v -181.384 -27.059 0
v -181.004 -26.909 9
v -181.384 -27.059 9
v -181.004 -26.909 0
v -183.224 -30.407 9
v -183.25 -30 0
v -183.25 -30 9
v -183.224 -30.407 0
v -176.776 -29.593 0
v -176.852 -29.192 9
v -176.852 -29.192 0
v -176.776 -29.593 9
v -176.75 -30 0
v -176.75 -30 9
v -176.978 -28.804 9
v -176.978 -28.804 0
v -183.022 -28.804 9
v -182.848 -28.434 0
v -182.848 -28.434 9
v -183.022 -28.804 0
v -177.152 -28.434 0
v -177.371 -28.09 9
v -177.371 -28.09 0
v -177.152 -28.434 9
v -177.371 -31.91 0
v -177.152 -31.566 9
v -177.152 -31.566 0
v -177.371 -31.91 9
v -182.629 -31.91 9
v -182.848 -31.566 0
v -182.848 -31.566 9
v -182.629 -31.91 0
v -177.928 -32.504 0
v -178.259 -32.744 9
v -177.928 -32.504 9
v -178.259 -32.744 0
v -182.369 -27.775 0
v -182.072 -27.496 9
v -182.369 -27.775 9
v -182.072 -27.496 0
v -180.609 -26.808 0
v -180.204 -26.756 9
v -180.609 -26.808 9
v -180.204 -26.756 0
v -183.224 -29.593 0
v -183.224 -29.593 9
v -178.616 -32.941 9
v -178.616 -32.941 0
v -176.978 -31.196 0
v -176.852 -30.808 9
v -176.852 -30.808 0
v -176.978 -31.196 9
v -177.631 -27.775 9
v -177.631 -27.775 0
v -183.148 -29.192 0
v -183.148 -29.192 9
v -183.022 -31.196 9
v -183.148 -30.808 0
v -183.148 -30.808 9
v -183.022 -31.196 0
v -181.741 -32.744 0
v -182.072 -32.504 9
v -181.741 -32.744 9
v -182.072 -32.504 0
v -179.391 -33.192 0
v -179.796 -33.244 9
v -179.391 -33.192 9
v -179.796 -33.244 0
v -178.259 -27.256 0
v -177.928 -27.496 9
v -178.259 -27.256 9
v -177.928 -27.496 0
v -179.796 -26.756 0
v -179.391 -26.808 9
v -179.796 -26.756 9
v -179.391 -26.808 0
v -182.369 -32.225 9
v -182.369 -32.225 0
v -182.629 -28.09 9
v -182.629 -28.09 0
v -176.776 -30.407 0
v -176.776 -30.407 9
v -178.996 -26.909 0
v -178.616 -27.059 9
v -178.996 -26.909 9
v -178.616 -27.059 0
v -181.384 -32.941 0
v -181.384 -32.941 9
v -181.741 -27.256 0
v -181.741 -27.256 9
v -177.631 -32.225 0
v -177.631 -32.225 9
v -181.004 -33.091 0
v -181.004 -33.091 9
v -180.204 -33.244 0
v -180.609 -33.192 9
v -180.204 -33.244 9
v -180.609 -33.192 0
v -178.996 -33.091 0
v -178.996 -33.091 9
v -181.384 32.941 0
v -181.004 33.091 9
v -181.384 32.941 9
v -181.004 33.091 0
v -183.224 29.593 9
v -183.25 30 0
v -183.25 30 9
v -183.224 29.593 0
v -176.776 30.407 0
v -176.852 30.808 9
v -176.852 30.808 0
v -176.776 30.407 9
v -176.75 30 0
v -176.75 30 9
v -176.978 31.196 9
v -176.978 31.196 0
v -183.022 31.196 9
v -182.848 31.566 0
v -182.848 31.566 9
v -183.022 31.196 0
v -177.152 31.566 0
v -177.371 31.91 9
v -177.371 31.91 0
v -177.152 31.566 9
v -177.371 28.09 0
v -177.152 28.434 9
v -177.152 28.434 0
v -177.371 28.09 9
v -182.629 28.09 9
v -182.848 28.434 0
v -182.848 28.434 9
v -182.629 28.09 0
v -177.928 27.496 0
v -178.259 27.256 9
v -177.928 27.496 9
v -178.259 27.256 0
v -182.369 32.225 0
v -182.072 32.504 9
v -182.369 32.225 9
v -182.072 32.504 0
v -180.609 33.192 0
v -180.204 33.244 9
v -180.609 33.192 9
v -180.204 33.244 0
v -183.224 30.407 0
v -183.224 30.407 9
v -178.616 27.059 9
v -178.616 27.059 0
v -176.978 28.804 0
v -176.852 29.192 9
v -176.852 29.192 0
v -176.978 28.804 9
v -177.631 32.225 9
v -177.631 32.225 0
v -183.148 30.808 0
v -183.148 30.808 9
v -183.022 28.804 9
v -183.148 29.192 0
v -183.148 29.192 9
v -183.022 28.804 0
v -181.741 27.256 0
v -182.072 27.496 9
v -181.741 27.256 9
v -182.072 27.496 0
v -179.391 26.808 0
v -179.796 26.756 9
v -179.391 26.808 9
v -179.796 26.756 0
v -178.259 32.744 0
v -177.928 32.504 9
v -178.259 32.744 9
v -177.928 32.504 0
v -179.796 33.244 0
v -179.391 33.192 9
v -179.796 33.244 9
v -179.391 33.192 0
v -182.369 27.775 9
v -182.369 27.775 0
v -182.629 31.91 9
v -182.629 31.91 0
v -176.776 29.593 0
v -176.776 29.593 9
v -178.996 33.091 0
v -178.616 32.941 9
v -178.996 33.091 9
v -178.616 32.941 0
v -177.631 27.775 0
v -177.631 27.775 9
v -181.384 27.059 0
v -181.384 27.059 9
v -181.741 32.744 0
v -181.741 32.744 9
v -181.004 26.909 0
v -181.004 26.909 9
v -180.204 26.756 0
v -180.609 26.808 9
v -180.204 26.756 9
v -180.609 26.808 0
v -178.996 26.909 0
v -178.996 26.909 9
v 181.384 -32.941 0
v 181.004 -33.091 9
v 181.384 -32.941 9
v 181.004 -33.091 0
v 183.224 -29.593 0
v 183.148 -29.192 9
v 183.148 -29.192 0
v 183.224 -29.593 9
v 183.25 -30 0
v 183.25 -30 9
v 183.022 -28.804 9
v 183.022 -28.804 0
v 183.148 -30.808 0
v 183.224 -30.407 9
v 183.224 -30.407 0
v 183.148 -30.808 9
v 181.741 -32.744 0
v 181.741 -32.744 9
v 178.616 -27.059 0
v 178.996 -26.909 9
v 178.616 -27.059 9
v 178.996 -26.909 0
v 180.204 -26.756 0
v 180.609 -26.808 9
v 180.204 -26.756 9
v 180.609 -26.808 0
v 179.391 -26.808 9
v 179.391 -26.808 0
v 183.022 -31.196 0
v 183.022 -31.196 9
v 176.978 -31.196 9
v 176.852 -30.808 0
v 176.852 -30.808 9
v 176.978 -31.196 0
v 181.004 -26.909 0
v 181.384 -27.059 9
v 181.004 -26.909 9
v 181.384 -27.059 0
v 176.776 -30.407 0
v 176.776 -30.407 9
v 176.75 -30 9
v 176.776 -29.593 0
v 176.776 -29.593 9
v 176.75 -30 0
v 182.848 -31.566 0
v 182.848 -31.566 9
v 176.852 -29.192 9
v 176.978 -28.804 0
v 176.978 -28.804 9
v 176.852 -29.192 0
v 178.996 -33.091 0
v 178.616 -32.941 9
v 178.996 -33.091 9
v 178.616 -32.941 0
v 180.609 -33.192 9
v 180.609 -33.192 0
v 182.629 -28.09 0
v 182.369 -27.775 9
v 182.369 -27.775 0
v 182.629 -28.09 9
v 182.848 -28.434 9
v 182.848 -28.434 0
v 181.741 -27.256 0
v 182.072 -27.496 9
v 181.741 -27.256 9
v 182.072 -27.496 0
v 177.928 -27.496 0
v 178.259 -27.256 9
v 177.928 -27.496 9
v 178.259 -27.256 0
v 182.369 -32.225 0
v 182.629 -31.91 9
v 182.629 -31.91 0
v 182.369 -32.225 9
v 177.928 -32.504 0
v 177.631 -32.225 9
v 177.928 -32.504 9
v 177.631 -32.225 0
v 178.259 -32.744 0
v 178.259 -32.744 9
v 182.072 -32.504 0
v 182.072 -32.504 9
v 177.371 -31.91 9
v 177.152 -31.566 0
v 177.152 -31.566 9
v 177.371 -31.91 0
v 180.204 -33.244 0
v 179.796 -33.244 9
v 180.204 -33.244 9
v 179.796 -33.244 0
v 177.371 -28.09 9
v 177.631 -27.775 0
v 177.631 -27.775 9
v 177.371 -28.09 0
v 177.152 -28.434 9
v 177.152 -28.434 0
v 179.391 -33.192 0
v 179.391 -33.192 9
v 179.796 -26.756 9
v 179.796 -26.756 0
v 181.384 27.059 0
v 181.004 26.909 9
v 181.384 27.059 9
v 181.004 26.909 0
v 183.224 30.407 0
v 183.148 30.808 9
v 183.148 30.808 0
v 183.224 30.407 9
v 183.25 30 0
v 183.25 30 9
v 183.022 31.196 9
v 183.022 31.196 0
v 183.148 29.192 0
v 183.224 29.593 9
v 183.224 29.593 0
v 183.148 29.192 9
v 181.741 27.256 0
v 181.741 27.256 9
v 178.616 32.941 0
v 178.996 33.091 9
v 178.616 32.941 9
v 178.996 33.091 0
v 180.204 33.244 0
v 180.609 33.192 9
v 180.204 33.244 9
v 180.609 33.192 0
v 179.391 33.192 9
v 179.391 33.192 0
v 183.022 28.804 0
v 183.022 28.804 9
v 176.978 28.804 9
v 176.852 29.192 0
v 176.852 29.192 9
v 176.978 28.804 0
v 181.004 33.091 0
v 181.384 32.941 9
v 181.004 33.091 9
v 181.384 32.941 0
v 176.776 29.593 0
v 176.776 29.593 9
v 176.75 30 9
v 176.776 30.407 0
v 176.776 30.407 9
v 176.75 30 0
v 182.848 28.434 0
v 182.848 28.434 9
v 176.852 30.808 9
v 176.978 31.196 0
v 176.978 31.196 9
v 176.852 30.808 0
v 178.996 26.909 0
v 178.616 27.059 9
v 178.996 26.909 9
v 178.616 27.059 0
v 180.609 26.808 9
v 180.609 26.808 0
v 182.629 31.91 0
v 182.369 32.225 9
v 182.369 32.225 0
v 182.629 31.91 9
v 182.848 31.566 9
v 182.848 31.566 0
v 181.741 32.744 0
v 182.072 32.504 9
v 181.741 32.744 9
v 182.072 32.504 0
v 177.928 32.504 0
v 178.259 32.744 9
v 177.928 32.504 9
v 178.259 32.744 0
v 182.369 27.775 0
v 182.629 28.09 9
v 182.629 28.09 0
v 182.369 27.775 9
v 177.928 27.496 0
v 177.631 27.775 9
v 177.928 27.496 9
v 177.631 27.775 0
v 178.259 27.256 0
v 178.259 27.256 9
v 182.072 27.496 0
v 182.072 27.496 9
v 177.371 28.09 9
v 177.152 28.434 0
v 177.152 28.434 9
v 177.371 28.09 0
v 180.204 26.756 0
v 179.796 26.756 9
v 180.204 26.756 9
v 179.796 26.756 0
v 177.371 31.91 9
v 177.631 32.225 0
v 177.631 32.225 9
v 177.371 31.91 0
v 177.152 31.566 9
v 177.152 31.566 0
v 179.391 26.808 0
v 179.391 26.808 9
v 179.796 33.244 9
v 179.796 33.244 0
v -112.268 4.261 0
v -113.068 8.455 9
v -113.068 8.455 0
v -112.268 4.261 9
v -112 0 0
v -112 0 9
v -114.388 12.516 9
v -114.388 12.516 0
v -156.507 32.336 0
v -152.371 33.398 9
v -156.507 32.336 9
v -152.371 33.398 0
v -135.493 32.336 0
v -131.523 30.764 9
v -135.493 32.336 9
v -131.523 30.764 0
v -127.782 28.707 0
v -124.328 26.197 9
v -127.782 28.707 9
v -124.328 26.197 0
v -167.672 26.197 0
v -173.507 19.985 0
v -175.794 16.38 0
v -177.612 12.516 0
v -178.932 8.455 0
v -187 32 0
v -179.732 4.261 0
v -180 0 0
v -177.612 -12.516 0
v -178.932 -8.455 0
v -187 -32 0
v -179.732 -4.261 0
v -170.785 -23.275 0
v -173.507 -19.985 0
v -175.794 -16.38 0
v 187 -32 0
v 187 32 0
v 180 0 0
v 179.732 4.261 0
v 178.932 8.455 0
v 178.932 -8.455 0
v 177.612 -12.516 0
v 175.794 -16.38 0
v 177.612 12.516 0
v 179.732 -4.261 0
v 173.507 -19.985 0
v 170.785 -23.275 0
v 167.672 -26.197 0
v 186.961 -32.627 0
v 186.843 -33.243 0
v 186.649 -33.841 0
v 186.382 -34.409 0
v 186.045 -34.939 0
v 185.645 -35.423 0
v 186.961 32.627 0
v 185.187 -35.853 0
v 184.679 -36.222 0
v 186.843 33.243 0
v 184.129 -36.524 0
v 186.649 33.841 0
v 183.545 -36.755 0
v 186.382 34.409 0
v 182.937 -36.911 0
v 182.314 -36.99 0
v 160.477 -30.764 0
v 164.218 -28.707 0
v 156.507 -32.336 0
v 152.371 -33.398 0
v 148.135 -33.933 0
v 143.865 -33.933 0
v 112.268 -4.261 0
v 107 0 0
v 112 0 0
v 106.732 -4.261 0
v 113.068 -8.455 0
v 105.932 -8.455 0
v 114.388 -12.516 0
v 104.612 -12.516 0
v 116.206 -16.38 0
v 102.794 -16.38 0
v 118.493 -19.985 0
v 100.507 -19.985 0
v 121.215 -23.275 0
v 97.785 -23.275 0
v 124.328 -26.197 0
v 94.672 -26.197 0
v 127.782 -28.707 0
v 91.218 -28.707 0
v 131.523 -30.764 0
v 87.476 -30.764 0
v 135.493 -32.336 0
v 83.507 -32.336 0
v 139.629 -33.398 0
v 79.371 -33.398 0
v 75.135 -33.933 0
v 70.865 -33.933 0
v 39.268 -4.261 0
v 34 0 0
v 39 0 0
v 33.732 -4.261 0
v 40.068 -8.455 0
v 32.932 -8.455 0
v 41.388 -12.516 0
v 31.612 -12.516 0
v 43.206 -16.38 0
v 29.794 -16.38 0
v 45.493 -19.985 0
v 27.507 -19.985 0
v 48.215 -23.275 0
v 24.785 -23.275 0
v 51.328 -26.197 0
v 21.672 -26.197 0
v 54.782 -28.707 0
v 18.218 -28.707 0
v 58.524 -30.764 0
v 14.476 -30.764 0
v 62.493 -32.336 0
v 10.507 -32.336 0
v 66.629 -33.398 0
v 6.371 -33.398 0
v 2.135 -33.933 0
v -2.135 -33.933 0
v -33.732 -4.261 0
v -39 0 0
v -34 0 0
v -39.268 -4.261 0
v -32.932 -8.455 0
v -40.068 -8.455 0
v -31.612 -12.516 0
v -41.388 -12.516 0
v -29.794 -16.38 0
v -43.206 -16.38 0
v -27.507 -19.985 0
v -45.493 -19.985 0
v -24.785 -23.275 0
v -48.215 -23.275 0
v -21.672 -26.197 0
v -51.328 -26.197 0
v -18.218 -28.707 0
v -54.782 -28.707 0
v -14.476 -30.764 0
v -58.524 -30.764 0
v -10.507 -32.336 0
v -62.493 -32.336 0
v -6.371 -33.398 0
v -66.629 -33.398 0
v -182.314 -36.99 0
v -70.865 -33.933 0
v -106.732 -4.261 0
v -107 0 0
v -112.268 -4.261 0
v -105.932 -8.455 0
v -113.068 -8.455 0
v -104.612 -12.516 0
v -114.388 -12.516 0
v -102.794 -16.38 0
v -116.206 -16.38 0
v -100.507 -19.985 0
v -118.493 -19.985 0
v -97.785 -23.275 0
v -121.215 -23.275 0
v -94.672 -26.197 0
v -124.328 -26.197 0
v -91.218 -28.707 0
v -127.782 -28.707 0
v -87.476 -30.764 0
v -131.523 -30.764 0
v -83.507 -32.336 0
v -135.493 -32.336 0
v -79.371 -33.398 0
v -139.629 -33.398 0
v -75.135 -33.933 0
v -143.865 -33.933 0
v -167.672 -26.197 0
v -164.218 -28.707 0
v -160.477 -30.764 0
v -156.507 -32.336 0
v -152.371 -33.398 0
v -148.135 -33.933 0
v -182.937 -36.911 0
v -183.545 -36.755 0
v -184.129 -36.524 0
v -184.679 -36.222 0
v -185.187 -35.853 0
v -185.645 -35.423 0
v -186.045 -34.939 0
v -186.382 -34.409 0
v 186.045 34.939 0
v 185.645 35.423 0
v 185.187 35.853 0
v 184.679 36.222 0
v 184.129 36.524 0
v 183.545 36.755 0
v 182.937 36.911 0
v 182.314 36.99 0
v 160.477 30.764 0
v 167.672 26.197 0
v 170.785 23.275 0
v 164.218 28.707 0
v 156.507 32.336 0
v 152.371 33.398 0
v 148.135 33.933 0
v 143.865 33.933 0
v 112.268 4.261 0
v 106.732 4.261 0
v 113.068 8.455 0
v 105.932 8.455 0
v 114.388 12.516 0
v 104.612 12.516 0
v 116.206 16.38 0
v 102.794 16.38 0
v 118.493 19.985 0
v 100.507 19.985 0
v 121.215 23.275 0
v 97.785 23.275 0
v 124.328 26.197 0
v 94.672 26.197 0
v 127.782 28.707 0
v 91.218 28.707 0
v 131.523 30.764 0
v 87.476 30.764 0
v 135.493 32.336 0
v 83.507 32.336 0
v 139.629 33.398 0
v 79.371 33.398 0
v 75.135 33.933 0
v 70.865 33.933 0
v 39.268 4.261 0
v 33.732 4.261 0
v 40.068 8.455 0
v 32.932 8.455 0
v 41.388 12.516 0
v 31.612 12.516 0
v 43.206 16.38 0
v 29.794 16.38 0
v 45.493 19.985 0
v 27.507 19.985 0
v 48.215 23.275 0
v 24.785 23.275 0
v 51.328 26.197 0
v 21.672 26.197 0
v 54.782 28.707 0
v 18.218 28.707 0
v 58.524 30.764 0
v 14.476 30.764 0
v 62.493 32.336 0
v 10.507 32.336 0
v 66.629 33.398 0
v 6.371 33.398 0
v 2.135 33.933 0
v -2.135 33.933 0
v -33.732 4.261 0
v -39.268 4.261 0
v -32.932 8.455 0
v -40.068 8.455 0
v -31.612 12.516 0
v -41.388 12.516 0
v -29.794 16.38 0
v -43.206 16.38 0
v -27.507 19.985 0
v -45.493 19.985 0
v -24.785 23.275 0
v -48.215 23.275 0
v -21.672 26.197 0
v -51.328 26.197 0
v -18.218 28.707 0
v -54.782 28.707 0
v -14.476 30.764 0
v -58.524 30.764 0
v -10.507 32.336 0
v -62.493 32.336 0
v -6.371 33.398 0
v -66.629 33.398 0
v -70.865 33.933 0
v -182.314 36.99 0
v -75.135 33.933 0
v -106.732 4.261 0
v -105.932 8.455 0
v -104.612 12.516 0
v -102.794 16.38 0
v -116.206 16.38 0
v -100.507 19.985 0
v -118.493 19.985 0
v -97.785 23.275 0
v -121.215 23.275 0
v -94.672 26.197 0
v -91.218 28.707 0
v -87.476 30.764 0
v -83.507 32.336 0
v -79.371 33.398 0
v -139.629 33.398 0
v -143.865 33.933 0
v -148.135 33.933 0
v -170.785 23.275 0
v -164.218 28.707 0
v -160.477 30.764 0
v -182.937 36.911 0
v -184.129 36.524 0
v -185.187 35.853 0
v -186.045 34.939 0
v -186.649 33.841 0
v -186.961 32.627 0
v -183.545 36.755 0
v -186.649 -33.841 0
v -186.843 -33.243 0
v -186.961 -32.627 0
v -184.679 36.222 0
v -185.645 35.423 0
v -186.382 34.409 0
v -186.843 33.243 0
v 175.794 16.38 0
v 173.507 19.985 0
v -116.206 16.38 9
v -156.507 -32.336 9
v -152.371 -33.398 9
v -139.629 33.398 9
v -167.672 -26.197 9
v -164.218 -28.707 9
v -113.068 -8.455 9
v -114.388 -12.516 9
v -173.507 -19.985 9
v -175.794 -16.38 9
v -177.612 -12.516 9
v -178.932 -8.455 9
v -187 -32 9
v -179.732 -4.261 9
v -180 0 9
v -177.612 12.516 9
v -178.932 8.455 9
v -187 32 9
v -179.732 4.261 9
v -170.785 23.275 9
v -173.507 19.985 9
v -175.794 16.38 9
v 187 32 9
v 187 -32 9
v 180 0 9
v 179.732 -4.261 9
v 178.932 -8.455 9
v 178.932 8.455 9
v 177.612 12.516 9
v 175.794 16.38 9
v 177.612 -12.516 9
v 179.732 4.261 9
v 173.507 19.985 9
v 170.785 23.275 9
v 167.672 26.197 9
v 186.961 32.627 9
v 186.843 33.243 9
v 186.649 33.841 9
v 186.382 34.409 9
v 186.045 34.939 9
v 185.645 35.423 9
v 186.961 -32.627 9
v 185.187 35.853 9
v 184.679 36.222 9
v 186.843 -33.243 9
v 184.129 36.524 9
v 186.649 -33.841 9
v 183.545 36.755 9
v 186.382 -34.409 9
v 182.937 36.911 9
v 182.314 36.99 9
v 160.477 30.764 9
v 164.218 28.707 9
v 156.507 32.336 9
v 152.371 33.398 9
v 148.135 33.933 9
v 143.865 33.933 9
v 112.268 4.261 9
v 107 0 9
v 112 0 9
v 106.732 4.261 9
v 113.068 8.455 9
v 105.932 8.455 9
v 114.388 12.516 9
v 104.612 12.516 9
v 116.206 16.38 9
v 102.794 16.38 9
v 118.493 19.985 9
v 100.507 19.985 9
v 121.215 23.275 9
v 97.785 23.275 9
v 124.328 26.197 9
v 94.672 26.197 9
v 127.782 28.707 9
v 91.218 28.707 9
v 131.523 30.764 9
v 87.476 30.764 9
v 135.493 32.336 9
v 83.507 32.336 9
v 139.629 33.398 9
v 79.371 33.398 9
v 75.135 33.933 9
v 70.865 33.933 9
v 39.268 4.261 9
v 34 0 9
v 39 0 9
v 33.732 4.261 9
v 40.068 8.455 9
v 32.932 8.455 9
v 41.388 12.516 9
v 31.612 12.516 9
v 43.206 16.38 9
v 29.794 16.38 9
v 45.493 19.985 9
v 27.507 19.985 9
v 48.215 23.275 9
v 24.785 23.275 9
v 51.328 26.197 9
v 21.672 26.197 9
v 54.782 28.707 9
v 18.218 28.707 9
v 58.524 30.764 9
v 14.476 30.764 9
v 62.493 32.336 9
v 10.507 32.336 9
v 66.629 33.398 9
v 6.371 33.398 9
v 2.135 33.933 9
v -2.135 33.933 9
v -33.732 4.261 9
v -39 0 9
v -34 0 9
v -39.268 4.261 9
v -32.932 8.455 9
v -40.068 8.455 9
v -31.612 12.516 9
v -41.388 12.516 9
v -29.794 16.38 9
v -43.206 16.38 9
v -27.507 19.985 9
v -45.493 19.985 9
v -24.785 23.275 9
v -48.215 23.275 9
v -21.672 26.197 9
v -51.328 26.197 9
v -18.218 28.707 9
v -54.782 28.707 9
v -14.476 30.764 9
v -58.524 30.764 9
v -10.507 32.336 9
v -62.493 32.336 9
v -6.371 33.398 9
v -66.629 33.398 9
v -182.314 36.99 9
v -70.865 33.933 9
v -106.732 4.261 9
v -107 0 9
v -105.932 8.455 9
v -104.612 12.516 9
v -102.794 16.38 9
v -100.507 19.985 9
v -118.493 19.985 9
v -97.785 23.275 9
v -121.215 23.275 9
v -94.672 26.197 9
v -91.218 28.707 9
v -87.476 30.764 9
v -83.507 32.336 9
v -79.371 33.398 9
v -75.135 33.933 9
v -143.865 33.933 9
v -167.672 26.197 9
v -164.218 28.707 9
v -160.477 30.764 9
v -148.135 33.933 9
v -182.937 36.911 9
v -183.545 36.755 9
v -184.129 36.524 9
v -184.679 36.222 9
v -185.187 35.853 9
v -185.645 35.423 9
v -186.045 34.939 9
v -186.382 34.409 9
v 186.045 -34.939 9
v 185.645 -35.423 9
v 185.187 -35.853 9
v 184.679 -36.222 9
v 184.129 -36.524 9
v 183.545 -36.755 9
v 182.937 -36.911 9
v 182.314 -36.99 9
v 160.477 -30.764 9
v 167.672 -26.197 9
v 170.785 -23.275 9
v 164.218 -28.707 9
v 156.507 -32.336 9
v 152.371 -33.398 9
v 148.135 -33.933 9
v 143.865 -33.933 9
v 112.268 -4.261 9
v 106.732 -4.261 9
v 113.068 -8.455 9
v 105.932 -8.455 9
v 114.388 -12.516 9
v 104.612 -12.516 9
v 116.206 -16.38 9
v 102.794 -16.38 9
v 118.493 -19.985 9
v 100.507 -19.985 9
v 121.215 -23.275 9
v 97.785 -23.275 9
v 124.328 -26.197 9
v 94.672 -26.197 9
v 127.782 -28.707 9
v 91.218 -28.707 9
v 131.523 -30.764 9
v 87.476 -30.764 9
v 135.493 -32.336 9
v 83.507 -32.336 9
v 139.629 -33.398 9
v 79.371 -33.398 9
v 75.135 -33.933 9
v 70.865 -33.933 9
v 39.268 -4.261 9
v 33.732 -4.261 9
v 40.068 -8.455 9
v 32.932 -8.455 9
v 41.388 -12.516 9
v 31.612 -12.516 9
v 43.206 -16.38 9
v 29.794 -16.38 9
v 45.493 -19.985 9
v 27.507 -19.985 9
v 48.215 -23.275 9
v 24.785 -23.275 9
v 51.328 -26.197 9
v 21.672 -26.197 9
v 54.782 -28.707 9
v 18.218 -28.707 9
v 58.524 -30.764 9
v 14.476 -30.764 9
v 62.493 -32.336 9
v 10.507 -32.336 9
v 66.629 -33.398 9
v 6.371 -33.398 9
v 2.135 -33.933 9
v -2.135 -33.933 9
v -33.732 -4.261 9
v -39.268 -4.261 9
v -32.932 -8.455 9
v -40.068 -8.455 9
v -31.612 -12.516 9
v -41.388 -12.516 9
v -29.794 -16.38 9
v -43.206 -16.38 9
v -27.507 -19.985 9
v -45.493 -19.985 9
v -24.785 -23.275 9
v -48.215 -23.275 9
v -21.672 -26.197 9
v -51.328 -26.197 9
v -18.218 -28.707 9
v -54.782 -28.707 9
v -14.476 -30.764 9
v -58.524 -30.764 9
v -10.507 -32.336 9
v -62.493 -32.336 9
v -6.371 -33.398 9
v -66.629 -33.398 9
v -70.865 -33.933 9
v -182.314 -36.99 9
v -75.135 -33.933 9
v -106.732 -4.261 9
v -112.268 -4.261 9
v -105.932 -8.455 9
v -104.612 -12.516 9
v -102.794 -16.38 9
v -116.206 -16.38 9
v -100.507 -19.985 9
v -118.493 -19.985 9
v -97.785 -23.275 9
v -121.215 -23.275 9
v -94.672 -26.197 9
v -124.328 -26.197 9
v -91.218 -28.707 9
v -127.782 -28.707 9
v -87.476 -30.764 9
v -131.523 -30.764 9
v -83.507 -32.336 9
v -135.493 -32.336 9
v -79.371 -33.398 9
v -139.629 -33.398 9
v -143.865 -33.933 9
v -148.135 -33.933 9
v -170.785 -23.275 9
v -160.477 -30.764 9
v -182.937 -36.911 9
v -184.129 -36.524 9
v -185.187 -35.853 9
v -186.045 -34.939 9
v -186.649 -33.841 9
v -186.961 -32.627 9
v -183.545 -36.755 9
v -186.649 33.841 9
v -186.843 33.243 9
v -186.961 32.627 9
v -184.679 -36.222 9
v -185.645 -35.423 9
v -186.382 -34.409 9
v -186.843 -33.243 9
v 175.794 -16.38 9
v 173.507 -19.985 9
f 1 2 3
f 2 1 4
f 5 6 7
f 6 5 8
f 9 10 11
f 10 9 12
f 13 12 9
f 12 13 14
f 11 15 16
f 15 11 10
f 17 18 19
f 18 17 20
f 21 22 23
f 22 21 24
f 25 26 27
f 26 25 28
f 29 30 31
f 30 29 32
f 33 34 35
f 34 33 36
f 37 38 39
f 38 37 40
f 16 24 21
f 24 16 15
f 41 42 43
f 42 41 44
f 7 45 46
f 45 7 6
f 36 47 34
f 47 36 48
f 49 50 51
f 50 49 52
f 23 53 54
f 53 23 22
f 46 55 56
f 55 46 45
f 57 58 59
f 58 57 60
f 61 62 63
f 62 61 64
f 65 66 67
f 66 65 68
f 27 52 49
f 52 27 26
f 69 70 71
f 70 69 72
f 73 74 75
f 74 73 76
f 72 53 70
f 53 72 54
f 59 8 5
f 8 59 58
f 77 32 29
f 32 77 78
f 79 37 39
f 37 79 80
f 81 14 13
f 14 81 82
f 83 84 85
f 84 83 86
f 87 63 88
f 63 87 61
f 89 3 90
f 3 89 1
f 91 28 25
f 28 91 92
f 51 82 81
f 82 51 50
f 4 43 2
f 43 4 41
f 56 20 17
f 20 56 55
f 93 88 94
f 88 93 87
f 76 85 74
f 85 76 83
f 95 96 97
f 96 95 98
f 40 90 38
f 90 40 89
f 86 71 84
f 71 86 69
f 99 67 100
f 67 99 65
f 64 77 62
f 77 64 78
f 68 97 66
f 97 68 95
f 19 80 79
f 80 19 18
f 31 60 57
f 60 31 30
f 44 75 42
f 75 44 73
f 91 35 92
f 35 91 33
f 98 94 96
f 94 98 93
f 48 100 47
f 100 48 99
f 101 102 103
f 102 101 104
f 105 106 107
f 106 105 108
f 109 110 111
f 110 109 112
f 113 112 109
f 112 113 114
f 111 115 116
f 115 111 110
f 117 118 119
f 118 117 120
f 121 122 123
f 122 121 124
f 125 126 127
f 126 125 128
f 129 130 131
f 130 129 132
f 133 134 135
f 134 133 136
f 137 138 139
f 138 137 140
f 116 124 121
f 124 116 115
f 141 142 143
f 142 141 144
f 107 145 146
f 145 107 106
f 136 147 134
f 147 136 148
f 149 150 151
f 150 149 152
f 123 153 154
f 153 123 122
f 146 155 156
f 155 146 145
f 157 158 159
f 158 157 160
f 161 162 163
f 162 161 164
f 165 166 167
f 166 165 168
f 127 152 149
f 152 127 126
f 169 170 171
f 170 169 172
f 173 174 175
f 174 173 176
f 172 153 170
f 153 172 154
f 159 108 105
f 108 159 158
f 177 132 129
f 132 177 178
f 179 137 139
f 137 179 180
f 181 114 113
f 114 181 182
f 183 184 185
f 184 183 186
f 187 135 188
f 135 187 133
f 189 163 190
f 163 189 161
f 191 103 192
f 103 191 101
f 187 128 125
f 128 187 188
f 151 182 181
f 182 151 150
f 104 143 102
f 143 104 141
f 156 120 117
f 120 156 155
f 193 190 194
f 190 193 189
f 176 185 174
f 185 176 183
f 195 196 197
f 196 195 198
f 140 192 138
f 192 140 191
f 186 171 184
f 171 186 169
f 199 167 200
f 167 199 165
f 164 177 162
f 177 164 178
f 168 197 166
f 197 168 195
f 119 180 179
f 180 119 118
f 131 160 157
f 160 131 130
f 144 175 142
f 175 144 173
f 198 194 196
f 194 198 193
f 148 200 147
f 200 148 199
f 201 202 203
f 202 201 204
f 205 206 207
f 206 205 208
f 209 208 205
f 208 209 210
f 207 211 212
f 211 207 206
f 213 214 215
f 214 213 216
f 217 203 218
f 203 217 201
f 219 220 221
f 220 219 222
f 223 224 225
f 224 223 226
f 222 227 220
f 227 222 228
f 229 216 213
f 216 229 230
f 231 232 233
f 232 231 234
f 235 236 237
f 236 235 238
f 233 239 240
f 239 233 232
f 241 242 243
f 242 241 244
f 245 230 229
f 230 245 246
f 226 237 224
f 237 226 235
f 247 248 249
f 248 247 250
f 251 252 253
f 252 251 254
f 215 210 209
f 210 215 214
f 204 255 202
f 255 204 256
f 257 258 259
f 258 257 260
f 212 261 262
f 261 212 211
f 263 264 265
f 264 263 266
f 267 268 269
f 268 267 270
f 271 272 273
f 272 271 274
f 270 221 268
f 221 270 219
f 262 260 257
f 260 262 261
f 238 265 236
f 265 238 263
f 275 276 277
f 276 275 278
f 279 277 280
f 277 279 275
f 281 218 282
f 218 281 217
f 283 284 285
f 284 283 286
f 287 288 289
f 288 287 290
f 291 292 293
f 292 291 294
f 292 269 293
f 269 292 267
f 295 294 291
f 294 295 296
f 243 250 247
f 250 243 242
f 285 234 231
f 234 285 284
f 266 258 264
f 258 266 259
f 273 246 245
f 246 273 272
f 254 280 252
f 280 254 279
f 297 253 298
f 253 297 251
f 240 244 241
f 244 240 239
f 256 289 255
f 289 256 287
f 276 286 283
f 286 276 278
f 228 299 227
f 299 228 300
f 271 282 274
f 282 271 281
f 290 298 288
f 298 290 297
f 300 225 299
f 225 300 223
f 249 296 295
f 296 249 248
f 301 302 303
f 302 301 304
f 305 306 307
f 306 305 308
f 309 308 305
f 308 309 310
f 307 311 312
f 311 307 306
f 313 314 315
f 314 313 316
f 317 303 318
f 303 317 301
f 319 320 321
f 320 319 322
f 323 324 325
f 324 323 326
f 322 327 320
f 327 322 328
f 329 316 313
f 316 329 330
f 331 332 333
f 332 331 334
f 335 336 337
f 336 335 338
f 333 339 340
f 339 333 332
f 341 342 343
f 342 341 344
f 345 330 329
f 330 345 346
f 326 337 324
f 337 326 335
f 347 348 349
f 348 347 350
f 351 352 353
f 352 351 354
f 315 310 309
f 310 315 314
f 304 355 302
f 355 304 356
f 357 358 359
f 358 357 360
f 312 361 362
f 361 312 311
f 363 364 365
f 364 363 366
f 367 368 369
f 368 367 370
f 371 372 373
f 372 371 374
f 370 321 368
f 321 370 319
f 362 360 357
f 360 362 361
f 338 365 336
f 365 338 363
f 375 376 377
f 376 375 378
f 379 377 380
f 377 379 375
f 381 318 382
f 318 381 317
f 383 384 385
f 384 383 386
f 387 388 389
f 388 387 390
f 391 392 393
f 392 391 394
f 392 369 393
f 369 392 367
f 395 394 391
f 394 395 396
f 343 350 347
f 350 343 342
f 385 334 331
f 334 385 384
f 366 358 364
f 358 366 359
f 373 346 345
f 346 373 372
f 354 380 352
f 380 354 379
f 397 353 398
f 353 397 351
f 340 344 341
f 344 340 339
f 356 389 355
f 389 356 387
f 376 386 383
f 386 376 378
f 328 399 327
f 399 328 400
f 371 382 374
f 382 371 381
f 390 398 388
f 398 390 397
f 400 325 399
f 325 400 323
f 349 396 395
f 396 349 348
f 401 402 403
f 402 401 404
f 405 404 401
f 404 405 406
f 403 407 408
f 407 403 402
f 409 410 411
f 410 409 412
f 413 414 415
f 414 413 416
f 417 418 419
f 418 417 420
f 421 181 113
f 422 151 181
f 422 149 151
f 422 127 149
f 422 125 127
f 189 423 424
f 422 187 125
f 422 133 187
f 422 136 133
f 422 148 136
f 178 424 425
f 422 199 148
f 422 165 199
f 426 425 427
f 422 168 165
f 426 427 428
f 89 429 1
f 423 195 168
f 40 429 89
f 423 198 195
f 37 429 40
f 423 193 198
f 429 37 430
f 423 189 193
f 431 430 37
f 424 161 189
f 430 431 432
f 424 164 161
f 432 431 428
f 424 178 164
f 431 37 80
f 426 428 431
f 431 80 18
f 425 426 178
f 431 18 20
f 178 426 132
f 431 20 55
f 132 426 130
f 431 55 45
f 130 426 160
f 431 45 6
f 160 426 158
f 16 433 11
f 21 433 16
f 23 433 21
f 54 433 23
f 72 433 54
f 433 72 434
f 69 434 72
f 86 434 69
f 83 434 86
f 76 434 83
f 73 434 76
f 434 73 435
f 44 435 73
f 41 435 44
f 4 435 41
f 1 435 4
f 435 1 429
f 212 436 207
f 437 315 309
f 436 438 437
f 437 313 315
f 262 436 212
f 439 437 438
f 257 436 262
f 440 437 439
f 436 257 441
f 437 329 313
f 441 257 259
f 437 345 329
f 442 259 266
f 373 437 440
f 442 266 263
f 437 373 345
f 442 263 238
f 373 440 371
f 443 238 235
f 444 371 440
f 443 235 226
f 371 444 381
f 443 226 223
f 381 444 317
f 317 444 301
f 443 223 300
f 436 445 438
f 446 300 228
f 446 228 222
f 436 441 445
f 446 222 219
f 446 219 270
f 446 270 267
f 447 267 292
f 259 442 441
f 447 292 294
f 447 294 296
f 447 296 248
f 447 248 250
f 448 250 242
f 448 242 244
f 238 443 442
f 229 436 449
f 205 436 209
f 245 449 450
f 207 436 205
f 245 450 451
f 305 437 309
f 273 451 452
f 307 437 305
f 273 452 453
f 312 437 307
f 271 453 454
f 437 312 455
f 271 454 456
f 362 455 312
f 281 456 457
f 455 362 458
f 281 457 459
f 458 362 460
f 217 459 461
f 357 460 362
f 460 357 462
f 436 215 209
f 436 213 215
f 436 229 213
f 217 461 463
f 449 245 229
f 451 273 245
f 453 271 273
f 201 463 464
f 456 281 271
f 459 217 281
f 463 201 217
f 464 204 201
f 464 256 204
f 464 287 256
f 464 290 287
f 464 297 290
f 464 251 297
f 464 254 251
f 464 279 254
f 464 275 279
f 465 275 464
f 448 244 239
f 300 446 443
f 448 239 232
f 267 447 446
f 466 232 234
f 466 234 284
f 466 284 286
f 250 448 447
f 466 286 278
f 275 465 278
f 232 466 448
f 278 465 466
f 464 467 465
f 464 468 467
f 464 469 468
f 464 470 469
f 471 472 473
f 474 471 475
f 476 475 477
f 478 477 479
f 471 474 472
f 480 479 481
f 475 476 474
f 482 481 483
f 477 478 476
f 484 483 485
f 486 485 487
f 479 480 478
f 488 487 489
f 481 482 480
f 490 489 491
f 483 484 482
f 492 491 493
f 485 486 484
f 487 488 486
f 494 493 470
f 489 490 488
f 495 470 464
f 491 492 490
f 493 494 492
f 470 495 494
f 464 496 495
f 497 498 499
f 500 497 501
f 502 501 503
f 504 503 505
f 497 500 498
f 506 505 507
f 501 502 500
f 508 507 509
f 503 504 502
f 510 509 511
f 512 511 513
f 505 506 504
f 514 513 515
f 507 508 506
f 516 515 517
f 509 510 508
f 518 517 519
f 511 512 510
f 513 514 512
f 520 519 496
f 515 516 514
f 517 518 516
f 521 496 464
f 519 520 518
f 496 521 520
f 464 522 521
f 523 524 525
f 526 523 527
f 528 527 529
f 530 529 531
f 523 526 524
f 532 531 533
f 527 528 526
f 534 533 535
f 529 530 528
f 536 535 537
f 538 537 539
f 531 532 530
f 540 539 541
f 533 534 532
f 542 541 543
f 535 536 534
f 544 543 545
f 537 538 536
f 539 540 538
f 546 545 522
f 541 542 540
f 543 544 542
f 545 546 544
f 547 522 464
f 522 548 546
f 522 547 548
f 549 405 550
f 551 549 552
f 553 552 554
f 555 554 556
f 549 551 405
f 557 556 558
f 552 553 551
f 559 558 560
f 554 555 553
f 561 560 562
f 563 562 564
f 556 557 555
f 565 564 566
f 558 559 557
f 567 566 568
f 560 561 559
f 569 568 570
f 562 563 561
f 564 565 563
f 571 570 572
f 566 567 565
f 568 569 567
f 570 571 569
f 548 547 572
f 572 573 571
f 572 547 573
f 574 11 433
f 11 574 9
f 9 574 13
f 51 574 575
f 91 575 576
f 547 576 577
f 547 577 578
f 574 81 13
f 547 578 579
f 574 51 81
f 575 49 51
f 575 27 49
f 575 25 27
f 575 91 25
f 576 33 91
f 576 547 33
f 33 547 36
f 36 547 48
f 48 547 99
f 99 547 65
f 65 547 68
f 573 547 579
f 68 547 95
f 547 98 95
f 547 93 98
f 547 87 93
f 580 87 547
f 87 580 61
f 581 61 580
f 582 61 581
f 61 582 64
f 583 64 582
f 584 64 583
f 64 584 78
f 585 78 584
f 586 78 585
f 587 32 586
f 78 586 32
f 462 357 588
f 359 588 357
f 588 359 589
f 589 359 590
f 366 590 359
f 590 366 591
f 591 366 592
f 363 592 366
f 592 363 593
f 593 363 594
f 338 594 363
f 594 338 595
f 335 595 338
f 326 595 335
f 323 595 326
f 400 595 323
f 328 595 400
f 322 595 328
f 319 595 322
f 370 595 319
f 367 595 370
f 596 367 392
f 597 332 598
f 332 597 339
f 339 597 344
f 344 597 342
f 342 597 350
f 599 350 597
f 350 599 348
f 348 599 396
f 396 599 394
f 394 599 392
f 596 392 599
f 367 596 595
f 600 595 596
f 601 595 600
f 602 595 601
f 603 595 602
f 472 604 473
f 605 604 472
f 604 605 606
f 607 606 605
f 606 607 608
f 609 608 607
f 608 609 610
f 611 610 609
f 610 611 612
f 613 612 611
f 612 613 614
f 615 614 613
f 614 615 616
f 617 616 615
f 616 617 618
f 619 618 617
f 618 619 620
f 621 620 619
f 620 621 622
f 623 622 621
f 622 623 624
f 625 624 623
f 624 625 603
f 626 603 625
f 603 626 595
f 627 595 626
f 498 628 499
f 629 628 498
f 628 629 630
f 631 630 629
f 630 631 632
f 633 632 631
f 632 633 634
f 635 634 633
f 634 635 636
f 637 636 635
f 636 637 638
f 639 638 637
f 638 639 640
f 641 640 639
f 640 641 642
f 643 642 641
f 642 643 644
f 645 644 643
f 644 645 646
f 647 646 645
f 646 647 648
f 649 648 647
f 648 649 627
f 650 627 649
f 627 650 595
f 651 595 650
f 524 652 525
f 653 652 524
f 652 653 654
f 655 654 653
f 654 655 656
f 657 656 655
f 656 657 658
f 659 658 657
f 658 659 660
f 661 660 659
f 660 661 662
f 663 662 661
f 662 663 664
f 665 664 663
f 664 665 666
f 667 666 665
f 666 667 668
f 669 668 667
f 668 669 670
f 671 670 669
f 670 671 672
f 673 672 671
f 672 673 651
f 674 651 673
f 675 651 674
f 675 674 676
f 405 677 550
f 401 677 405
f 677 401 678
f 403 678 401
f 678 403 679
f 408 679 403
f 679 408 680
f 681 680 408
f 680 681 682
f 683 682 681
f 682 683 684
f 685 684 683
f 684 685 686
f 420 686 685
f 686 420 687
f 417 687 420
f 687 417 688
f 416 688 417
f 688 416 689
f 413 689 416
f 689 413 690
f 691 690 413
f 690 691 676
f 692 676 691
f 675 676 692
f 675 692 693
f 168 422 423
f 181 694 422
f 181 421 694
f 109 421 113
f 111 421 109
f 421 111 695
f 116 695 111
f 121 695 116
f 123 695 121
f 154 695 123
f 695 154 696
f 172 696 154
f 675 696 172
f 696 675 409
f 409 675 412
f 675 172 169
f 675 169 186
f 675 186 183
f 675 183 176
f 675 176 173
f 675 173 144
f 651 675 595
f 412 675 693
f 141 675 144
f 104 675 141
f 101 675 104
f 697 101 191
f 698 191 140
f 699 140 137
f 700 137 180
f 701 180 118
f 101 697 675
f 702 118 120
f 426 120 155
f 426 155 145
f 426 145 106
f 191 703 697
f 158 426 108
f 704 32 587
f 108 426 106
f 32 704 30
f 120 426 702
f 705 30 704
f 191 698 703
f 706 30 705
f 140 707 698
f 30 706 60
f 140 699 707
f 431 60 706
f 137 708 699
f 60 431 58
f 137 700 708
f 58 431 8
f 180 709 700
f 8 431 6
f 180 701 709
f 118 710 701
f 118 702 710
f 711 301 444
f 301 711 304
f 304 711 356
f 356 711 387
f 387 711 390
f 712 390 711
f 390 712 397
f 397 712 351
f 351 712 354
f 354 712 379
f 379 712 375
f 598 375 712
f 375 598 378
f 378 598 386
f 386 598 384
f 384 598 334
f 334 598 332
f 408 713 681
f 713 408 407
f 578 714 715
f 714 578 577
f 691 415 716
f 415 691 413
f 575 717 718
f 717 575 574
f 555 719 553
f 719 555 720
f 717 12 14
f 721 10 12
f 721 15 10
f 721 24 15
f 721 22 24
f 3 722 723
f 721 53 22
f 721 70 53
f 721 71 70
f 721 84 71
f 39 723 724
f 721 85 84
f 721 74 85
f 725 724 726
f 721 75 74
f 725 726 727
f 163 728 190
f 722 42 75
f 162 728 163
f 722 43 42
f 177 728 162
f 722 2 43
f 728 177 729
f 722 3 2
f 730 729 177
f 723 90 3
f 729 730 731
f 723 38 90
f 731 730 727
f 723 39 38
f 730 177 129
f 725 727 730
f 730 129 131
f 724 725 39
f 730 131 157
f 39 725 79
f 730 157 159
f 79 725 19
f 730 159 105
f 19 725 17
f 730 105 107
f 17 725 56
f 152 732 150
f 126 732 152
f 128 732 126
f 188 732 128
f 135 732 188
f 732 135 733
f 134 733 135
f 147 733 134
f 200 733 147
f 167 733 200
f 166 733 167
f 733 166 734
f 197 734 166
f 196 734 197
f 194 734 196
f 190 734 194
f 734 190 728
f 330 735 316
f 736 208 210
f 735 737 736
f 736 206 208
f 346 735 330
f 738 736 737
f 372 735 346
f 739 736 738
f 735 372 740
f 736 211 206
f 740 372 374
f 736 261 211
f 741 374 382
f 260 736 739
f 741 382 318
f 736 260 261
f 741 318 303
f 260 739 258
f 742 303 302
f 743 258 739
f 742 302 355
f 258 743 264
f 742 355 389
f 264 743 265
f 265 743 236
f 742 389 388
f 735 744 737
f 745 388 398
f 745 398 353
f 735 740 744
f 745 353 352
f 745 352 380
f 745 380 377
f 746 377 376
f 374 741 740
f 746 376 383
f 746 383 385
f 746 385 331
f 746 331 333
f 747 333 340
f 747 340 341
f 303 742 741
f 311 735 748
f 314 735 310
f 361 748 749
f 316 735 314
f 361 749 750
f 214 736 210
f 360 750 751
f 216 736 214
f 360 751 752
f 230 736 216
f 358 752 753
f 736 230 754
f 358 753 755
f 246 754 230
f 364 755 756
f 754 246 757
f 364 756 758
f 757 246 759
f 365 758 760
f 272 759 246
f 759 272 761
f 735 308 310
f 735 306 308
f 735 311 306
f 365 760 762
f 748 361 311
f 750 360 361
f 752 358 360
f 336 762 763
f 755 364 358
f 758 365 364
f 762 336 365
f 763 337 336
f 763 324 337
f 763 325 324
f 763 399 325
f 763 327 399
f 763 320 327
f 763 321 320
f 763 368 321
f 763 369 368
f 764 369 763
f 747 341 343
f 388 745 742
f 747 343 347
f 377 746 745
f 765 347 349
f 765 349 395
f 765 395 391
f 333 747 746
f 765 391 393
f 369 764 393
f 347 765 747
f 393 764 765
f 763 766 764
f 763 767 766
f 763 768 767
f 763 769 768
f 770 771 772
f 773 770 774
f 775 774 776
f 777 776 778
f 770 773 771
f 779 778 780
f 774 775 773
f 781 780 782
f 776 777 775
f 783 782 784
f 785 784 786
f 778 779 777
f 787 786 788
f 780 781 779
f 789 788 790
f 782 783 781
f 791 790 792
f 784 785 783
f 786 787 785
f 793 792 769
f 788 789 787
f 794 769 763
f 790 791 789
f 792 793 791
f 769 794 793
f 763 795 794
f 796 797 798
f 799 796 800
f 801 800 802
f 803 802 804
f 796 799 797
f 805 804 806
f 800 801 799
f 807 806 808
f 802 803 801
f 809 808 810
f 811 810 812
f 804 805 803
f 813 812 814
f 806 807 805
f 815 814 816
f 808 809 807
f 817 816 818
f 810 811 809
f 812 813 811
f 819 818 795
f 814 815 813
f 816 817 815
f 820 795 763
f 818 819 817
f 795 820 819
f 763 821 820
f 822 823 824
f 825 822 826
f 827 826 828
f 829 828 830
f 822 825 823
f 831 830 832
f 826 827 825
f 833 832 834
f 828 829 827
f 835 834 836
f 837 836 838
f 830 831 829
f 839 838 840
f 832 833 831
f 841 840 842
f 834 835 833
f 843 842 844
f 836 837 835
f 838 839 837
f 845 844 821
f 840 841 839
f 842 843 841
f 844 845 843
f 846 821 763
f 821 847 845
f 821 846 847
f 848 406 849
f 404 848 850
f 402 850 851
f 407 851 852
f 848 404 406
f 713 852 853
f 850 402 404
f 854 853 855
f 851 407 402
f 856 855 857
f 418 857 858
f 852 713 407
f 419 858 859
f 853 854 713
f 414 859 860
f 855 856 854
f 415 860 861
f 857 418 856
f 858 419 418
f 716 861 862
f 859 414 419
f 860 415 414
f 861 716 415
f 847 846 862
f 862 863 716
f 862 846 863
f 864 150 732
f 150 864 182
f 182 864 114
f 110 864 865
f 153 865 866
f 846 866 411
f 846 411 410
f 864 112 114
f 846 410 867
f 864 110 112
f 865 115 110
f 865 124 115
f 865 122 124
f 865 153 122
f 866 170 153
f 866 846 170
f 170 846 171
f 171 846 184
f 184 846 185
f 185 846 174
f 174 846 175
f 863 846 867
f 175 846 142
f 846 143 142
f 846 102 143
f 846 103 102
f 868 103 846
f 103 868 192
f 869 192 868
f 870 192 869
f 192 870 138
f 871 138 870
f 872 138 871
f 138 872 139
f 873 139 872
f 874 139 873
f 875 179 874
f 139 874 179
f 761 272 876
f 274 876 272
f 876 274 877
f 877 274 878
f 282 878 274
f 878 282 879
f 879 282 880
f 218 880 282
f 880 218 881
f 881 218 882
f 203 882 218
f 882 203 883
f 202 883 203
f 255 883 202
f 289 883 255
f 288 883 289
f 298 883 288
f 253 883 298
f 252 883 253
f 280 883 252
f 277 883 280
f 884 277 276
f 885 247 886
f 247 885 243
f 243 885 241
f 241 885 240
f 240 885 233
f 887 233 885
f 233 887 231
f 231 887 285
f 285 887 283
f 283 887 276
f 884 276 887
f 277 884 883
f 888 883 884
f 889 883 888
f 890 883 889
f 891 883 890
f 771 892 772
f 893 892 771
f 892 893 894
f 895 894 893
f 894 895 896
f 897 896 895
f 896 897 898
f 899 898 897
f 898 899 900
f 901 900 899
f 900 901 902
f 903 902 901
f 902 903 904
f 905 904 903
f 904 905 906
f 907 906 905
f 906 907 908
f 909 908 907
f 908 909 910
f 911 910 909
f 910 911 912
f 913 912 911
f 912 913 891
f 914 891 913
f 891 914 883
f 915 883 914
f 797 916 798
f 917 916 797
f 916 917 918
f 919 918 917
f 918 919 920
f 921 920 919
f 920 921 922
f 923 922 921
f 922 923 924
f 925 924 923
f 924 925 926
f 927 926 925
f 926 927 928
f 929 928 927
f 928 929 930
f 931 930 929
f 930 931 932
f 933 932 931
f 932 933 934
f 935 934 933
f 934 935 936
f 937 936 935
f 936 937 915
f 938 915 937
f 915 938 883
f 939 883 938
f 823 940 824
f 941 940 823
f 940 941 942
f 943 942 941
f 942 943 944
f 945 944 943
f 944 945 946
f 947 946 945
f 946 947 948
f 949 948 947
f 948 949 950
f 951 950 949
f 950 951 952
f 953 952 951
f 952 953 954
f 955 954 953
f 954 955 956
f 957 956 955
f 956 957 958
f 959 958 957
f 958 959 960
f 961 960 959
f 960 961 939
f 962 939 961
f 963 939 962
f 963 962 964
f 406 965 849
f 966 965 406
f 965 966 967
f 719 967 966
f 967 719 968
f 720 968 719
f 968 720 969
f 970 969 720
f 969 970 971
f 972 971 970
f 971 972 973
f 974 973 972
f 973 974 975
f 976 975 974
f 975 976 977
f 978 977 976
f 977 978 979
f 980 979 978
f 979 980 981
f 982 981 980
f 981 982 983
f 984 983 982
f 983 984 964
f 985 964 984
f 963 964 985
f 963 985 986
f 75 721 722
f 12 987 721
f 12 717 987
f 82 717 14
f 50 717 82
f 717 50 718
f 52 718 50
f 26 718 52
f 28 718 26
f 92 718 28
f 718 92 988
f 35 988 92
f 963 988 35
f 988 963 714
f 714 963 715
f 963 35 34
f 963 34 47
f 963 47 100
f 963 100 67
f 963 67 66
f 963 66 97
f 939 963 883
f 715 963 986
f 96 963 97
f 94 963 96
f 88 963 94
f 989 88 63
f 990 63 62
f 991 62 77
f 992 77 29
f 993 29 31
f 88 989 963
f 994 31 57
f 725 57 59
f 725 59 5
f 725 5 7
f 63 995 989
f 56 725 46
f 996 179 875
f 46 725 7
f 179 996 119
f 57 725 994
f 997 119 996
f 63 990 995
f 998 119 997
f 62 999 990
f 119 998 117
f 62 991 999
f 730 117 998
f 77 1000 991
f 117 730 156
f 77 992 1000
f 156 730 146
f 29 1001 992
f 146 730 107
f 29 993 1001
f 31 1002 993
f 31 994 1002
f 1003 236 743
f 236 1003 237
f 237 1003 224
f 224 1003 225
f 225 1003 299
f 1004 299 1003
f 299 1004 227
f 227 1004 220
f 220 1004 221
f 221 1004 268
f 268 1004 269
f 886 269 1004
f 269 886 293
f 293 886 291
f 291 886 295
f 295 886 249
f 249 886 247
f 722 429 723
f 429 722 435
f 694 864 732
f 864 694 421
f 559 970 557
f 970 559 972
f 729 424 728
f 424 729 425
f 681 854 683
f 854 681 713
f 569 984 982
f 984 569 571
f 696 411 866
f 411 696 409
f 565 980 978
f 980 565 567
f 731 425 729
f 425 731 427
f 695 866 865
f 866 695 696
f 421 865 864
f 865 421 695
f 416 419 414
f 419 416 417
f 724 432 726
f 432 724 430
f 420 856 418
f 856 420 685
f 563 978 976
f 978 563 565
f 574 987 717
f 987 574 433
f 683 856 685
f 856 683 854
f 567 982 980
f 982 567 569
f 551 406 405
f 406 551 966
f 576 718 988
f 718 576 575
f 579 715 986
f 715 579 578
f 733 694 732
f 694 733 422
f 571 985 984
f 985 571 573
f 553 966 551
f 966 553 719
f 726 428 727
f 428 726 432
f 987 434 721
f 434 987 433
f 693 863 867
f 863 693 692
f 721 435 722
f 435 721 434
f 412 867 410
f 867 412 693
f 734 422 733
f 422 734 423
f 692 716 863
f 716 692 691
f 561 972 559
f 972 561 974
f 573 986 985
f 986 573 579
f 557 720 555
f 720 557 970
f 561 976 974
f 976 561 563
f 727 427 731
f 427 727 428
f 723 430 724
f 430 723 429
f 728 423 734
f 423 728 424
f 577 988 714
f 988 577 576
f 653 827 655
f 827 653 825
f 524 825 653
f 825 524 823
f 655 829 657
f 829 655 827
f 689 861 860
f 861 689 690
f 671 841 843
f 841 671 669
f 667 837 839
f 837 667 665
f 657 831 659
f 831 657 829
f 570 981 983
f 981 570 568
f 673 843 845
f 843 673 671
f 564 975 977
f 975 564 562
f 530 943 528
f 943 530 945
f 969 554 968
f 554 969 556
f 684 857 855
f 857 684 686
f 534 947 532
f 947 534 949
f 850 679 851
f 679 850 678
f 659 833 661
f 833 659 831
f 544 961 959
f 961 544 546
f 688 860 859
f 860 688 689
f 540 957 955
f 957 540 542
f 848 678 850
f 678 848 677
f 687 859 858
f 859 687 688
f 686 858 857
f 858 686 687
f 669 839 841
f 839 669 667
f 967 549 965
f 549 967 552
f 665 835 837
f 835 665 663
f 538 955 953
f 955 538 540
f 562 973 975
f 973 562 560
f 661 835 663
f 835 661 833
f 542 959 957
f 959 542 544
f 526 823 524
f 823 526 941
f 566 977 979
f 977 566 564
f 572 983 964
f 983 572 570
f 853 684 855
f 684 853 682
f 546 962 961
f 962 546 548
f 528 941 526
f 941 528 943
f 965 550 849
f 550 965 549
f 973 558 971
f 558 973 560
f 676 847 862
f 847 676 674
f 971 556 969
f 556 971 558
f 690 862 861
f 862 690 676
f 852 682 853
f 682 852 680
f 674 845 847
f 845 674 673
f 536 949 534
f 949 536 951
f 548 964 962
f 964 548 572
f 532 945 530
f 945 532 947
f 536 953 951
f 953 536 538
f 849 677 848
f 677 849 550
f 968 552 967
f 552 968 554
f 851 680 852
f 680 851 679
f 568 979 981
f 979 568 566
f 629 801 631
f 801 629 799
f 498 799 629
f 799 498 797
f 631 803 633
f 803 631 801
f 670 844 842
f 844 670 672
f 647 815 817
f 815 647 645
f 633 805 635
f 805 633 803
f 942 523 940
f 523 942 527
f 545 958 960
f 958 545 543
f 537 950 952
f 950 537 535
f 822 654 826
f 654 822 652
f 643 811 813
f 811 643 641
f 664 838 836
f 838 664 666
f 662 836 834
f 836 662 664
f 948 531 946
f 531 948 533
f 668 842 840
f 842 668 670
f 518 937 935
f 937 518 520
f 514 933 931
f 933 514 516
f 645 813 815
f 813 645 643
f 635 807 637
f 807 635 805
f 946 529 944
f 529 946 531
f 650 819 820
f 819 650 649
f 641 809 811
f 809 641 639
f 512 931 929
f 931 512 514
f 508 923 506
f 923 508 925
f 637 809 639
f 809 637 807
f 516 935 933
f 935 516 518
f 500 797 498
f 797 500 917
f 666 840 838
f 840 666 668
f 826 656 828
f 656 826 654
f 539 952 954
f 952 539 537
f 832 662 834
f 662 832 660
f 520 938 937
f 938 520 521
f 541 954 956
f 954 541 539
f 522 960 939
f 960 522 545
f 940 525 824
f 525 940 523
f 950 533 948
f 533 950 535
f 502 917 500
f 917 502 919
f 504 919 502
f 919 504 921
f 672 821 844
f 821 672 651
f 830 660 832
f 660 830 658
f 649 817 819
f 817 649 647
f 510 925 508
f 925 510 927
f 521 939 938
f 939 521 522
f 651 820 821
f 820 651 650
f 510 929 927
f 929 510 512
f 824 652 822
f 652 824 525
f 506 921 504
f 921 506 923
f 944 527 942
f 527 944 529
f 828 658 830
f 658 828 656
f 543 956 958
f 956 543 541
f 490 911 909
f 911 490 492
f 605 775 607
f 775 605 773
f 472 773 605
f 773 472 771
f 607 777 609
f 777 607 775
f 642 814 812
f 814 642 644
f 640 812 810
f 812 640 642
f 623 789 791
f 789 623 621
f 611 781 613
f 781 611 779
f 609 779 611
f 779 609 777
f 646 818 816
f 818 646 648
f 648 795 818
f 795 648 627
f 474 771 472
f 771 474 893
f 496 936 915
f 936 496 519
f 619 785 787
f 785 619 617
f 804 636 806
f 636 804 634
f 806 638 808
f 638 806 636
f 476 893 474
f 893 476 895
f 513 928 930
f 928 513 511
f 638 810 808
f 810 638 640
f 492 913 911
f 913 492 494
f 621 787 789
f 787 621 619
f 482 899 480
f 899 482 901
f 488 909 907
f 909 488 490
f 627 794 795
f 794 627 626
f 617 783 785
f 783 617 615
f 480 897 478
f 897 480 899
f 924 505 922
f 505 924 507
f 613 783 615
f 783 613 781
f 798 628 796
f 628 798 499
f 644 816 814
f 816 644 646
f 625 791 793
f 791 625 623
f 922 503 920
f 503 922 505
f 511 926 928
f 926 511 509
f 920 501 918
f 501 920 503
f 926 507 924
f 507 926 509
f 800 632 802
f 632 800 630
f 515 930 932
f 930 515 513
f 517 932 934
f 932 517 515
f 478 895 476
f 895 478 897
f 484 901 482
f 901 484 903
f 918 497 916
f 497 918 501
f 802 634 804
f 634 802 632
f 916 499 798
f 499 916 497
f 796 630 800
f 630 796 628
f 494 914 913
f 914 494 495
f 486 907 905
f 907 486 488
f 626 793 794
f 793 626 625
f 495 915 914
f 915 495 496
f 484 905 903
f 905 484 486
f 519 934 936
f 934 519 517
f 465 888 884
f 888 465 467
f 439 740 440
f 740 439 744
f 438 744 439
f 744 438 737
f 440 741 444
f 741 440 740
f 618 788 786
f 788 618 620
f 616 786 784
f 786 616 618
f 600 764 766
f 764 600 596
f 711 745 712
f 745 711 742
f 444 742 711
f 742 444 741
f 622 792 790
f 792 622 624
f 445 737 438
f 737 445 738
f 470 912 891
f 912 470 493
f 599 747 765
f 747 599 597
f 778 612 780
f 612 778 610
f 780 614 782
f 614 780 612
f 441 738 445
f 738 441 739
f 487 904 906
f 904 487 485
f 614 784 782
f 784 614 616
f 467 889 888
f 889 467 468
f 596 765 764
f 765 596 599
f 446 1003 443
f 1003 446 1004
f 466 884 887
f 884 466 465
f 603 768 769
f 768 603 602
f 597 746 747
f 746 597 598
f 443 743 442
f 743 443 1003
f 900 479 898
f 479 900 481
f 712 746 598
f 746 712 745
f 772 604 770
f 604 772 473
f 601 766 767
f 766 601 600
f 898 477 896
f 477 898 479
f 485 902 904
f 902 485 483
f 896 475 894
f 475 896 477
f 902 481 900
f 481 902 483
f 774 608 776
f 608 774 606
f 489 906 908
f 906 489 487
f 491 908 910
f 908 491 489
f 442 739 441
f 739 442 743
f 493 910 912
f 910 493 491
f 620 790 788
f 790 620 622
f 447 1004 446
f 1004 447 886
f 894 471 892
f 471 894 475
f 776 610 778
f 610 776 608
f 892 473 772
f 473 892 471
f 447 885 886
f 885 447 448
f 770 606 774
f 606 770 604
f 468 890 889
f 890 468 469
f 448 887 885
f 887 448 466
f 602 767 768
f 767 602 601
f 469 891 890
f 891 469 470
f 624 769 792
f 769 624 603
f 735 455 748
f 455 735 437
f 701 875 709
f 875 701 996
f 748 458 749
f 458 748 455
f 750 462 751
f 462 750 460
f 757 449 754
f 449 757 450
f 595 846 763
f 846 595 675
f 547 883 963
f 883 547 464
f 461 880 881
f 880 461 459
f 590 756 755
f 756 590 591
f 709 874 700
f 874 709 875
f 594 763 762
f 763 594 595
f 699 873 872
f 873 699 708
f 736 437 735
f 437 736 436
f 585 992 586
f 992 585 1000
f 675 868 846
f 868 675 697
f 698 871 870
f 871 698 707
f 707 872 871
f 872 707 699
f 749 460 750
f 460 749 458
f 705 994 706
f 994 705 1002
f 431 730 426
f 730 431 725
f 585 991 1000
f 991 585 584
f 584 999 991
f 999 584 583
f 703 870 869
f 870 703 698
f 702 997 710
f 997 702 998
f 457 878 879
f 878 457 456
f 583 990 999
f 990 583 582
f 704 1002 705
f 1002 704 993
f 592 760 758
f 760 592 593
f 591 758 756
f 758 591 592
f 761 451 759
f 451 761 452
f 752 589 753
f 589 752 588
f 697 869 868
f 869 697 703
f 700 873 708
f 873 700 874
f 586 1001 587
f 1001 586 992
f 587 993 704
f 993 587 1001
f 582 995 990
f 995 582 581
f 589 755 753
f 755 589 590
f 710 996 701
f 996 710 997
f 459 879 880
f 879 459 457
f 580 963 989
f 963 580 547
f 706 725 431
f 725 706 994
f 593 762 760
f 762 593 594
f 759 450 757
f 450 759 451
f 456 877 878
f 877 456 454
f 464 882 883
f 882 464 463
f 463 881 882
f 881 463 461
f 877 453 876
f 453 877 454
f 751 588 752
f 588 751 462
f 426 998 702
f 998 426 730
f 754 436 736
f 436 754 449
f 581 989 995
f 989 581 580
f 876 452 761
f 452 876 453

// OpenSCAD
$fn = 50;


difference() {
	union() {
		hull() {
			translate(v = [-182.0000000000, 32.0000000000, 0]) {
				cylinder(h = 9, r = 5);
			}
			translate(v = [182.0000000000, 32.0000000000, 0]) {
				cylinder(h = 9, r = 5);
			}
			translate(v = [-182.0000000000, -32.0000000000, 0]) {
				cylinder(h = 9, r = 5);
			}
			translate(v = [182.0000000000, -32.0000000000, 0]) {
				cylinder(h = 9, r = 5);
			}
		}
	}
	union() {
		#translate(v = [-180.0000000000, -30.0000000000, -100.0000000000]) {
			cylinder(h = 200, r = 3.2500000000);
		}
		#translate(v = [-180.0000000000, 30.0000000000, -100.0000000000]) {
			cylinder(h = 200, r = 3.2500000000);
		}
		#translate(v = [180.0000000000, -30.0000000000, -100.0000000000]) {
			cylinder(h = 200, r = 3.2500000000);
		}
		#translate(v = [180.0000000000, 30.0000000000, -100.0000000000]) {
			cylinder(h = 200, r = 3.2500000000);
		}
		#translate(v = [-146.0000000000, 0, 0]) {
			cylinder(h = 9, r = 34.0000000000);
		}
		#translate(v = [-73.0000000000, 0, 0]) {
			cylinder(h = 9, r = 34.0000000000);
		}
		#cylinder(h = 9, r = 34.0000000000);
		#translate(v = [73.0000000000, 0, 0]) {
			cylinder(h = 9, r = 34.0000000000);
		}
		#translate(v = [146.0000000000, 0, 0]) {
			cylinder(h = 9, r = 34.0000000000);
		}
	}
}
